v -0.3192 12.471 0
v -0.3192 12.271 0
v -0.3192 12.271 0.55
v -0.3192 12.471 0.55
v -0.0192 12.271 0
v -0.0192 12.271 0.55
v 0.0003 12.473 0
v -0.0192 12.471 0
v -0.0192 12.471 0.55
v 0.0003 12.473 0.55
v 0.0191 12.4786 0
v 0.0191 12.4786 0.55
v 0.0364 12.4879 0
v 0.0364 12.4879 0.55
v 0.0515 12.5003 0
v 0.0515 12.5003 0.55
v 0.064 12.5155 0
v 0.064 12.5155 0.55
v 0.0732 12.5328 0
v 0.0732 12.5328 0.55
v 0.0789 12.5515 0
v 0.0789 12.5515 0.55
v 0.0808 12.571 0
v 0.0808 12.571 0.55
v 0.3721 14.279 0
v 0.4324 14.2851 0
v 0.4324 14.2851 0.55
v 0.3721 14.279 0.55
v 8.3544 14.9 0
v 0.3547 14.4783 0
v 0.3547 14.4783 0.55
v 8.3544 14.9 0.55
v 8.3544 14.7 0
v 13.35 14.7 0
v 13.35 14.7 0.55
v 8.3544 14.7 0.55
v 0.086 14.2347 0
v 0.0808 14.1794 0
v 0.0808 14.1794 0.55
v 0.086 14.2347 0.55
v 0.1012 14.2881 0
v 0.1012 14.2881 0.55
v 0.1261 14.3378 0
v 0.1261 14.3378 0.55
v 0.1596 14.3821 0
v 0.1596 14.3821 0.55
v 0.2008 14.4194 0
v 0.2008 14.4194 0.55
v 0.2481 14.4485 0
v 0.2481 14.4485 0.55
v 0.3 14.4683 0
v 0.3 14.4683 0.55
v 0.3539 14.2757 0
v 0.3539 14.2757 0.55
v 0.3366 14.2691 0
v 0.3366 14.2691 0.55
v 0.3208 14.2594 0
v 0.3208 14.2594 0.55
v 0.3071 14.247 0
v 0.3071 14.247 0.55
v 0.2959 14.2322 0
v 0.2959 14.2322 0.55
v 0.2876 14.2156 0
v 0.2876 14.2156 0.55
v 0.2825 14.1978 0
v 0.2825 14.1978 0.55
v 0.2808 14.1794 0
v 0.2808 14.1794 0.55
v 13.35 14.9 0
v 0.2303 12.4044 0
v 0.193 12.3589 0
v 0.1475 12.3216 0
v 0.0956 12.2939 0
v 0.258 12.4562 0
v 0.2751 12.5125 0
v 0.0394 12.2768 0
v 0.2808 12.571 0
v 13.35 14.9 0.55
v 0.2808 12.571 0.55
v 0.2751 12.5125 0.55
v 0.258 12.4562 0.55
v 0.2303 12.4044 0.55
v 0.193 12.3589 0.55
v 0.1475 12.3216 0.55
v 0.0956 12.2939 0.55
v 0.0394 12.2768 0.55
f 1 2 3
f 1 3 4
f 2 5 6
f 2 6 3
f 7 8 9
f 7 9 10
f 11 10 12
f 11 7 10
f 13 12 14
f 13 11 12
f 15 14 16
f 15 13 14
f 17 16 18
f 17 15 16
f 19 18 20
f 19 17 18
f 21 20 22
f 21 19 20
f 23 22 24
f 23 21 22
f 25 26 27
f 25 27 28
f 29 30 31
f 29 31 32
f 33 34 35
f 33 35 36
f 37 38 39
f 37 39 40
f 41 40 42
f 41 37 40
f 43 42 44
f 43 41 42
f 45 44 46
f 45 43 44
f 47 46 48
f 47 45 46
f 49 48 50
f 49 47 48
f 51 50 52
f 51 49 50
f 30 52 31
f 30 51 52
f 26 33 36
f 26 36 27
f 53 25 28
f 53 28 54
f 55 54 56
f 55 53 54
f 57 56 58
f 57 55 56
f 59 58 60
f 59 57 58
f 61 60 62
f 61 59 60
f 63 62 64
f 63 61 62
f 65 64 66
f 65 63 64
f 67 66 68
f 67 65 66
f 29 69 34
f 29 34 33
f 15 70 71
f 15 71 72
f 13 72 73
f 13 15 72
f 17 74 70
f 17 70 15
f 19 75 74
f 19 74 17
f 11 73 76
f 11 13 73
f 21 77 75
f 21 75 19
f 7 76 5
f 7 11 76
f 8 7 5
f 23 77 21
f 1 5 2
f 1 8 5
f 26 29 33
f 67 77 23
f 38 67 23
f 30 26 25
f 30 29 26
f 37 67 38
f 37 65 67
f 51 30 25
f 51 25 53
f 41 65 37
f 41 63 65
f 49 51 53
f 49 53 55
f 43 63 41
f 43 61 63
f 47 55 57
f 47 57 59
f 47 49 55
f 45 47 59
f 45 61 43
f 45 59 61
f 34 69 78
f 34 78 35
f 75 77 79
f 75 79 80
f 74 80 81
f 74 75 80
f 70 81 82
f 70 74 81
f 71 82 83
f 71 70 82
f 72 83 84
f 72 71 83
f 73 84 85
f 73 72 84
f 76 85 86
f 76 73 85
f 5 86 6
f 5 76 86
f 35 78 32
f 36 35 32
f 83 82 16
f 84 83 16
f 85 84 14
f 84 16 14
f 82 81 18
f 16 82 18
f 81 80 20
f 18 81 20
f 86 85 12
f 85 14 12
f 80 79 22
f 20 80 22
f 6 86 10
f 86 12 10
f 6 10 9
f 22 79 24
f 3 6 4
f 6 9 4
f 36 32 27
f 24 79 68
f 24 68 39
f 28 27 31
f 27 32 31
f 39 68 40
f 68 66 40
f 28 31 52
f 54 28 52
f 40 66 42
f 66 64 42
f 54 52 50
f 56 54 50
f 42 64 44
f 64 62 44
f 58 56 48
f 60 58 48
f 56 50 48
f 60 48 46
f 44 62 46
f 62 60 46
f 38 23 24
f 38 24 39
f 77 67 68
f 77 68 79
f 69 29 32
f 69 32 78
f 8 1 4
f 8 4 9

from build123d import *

# Parameters (mm, degrees)
RESSALTO_EXTRUS_O1_DEPTH = 0.55


with BuildPart() as part:
    # Esboço1 → Ressalto-extrusão1 (new body)
    with BuildSketch(Plane.XY):
        with BuildLine():
            Line((-0.319177055, 12.471030264), (-0.019177055, 12.471030264))
            ThreePointArc((-0.019177055, 12.471030264), (0.051533624, 12.500319586), (0.080822945, 12.571030264))
            Line((0.080822945, 12.571030264), (0.080822945, 14.179397147))
            ThreePointArc((0.080822945, 14.179397147), (0.159639744, 14.382074209), (0.354676223, 14.478255556))
            Line((0.354676223, 14.478255556), (8.354366094, 14.9))
            Line((8.354366094, 14.9), (13.35, 14.9))
            Line((13.35, 14.9), (13.35, 14.7))
            Line((13.35, 14.7), (8.354366094, 14.7))
            Line((8.354366094, 14.7), (0.432418849, 14.285057155))
            Line((0.432418849, 14.285057155), (0.372107371, 14.279016616))
            ThreePointArc((0.372107371, 14.279016616), (0.307095212, 14.246956167), (0.280822945, 14.179397147))
            Line((0.280822945, 14.179397147), (0.280822945, 12.571030264))
            ThreePointArc((0.280822945, 12.571030264), (0.19295498, 12.35889823), (-0.019177055, 12.271030264))
            Line((-0.019177055, 12.271030264), (-0.319177055, 12.271030264))
            Line((-0.319177055, 12.271030264), (-0.319177055, 12.471030264))
        make_face()
    extrude(amount=RESSALTO_EXTRUS_O1_DEPTH)


solid = part.part
